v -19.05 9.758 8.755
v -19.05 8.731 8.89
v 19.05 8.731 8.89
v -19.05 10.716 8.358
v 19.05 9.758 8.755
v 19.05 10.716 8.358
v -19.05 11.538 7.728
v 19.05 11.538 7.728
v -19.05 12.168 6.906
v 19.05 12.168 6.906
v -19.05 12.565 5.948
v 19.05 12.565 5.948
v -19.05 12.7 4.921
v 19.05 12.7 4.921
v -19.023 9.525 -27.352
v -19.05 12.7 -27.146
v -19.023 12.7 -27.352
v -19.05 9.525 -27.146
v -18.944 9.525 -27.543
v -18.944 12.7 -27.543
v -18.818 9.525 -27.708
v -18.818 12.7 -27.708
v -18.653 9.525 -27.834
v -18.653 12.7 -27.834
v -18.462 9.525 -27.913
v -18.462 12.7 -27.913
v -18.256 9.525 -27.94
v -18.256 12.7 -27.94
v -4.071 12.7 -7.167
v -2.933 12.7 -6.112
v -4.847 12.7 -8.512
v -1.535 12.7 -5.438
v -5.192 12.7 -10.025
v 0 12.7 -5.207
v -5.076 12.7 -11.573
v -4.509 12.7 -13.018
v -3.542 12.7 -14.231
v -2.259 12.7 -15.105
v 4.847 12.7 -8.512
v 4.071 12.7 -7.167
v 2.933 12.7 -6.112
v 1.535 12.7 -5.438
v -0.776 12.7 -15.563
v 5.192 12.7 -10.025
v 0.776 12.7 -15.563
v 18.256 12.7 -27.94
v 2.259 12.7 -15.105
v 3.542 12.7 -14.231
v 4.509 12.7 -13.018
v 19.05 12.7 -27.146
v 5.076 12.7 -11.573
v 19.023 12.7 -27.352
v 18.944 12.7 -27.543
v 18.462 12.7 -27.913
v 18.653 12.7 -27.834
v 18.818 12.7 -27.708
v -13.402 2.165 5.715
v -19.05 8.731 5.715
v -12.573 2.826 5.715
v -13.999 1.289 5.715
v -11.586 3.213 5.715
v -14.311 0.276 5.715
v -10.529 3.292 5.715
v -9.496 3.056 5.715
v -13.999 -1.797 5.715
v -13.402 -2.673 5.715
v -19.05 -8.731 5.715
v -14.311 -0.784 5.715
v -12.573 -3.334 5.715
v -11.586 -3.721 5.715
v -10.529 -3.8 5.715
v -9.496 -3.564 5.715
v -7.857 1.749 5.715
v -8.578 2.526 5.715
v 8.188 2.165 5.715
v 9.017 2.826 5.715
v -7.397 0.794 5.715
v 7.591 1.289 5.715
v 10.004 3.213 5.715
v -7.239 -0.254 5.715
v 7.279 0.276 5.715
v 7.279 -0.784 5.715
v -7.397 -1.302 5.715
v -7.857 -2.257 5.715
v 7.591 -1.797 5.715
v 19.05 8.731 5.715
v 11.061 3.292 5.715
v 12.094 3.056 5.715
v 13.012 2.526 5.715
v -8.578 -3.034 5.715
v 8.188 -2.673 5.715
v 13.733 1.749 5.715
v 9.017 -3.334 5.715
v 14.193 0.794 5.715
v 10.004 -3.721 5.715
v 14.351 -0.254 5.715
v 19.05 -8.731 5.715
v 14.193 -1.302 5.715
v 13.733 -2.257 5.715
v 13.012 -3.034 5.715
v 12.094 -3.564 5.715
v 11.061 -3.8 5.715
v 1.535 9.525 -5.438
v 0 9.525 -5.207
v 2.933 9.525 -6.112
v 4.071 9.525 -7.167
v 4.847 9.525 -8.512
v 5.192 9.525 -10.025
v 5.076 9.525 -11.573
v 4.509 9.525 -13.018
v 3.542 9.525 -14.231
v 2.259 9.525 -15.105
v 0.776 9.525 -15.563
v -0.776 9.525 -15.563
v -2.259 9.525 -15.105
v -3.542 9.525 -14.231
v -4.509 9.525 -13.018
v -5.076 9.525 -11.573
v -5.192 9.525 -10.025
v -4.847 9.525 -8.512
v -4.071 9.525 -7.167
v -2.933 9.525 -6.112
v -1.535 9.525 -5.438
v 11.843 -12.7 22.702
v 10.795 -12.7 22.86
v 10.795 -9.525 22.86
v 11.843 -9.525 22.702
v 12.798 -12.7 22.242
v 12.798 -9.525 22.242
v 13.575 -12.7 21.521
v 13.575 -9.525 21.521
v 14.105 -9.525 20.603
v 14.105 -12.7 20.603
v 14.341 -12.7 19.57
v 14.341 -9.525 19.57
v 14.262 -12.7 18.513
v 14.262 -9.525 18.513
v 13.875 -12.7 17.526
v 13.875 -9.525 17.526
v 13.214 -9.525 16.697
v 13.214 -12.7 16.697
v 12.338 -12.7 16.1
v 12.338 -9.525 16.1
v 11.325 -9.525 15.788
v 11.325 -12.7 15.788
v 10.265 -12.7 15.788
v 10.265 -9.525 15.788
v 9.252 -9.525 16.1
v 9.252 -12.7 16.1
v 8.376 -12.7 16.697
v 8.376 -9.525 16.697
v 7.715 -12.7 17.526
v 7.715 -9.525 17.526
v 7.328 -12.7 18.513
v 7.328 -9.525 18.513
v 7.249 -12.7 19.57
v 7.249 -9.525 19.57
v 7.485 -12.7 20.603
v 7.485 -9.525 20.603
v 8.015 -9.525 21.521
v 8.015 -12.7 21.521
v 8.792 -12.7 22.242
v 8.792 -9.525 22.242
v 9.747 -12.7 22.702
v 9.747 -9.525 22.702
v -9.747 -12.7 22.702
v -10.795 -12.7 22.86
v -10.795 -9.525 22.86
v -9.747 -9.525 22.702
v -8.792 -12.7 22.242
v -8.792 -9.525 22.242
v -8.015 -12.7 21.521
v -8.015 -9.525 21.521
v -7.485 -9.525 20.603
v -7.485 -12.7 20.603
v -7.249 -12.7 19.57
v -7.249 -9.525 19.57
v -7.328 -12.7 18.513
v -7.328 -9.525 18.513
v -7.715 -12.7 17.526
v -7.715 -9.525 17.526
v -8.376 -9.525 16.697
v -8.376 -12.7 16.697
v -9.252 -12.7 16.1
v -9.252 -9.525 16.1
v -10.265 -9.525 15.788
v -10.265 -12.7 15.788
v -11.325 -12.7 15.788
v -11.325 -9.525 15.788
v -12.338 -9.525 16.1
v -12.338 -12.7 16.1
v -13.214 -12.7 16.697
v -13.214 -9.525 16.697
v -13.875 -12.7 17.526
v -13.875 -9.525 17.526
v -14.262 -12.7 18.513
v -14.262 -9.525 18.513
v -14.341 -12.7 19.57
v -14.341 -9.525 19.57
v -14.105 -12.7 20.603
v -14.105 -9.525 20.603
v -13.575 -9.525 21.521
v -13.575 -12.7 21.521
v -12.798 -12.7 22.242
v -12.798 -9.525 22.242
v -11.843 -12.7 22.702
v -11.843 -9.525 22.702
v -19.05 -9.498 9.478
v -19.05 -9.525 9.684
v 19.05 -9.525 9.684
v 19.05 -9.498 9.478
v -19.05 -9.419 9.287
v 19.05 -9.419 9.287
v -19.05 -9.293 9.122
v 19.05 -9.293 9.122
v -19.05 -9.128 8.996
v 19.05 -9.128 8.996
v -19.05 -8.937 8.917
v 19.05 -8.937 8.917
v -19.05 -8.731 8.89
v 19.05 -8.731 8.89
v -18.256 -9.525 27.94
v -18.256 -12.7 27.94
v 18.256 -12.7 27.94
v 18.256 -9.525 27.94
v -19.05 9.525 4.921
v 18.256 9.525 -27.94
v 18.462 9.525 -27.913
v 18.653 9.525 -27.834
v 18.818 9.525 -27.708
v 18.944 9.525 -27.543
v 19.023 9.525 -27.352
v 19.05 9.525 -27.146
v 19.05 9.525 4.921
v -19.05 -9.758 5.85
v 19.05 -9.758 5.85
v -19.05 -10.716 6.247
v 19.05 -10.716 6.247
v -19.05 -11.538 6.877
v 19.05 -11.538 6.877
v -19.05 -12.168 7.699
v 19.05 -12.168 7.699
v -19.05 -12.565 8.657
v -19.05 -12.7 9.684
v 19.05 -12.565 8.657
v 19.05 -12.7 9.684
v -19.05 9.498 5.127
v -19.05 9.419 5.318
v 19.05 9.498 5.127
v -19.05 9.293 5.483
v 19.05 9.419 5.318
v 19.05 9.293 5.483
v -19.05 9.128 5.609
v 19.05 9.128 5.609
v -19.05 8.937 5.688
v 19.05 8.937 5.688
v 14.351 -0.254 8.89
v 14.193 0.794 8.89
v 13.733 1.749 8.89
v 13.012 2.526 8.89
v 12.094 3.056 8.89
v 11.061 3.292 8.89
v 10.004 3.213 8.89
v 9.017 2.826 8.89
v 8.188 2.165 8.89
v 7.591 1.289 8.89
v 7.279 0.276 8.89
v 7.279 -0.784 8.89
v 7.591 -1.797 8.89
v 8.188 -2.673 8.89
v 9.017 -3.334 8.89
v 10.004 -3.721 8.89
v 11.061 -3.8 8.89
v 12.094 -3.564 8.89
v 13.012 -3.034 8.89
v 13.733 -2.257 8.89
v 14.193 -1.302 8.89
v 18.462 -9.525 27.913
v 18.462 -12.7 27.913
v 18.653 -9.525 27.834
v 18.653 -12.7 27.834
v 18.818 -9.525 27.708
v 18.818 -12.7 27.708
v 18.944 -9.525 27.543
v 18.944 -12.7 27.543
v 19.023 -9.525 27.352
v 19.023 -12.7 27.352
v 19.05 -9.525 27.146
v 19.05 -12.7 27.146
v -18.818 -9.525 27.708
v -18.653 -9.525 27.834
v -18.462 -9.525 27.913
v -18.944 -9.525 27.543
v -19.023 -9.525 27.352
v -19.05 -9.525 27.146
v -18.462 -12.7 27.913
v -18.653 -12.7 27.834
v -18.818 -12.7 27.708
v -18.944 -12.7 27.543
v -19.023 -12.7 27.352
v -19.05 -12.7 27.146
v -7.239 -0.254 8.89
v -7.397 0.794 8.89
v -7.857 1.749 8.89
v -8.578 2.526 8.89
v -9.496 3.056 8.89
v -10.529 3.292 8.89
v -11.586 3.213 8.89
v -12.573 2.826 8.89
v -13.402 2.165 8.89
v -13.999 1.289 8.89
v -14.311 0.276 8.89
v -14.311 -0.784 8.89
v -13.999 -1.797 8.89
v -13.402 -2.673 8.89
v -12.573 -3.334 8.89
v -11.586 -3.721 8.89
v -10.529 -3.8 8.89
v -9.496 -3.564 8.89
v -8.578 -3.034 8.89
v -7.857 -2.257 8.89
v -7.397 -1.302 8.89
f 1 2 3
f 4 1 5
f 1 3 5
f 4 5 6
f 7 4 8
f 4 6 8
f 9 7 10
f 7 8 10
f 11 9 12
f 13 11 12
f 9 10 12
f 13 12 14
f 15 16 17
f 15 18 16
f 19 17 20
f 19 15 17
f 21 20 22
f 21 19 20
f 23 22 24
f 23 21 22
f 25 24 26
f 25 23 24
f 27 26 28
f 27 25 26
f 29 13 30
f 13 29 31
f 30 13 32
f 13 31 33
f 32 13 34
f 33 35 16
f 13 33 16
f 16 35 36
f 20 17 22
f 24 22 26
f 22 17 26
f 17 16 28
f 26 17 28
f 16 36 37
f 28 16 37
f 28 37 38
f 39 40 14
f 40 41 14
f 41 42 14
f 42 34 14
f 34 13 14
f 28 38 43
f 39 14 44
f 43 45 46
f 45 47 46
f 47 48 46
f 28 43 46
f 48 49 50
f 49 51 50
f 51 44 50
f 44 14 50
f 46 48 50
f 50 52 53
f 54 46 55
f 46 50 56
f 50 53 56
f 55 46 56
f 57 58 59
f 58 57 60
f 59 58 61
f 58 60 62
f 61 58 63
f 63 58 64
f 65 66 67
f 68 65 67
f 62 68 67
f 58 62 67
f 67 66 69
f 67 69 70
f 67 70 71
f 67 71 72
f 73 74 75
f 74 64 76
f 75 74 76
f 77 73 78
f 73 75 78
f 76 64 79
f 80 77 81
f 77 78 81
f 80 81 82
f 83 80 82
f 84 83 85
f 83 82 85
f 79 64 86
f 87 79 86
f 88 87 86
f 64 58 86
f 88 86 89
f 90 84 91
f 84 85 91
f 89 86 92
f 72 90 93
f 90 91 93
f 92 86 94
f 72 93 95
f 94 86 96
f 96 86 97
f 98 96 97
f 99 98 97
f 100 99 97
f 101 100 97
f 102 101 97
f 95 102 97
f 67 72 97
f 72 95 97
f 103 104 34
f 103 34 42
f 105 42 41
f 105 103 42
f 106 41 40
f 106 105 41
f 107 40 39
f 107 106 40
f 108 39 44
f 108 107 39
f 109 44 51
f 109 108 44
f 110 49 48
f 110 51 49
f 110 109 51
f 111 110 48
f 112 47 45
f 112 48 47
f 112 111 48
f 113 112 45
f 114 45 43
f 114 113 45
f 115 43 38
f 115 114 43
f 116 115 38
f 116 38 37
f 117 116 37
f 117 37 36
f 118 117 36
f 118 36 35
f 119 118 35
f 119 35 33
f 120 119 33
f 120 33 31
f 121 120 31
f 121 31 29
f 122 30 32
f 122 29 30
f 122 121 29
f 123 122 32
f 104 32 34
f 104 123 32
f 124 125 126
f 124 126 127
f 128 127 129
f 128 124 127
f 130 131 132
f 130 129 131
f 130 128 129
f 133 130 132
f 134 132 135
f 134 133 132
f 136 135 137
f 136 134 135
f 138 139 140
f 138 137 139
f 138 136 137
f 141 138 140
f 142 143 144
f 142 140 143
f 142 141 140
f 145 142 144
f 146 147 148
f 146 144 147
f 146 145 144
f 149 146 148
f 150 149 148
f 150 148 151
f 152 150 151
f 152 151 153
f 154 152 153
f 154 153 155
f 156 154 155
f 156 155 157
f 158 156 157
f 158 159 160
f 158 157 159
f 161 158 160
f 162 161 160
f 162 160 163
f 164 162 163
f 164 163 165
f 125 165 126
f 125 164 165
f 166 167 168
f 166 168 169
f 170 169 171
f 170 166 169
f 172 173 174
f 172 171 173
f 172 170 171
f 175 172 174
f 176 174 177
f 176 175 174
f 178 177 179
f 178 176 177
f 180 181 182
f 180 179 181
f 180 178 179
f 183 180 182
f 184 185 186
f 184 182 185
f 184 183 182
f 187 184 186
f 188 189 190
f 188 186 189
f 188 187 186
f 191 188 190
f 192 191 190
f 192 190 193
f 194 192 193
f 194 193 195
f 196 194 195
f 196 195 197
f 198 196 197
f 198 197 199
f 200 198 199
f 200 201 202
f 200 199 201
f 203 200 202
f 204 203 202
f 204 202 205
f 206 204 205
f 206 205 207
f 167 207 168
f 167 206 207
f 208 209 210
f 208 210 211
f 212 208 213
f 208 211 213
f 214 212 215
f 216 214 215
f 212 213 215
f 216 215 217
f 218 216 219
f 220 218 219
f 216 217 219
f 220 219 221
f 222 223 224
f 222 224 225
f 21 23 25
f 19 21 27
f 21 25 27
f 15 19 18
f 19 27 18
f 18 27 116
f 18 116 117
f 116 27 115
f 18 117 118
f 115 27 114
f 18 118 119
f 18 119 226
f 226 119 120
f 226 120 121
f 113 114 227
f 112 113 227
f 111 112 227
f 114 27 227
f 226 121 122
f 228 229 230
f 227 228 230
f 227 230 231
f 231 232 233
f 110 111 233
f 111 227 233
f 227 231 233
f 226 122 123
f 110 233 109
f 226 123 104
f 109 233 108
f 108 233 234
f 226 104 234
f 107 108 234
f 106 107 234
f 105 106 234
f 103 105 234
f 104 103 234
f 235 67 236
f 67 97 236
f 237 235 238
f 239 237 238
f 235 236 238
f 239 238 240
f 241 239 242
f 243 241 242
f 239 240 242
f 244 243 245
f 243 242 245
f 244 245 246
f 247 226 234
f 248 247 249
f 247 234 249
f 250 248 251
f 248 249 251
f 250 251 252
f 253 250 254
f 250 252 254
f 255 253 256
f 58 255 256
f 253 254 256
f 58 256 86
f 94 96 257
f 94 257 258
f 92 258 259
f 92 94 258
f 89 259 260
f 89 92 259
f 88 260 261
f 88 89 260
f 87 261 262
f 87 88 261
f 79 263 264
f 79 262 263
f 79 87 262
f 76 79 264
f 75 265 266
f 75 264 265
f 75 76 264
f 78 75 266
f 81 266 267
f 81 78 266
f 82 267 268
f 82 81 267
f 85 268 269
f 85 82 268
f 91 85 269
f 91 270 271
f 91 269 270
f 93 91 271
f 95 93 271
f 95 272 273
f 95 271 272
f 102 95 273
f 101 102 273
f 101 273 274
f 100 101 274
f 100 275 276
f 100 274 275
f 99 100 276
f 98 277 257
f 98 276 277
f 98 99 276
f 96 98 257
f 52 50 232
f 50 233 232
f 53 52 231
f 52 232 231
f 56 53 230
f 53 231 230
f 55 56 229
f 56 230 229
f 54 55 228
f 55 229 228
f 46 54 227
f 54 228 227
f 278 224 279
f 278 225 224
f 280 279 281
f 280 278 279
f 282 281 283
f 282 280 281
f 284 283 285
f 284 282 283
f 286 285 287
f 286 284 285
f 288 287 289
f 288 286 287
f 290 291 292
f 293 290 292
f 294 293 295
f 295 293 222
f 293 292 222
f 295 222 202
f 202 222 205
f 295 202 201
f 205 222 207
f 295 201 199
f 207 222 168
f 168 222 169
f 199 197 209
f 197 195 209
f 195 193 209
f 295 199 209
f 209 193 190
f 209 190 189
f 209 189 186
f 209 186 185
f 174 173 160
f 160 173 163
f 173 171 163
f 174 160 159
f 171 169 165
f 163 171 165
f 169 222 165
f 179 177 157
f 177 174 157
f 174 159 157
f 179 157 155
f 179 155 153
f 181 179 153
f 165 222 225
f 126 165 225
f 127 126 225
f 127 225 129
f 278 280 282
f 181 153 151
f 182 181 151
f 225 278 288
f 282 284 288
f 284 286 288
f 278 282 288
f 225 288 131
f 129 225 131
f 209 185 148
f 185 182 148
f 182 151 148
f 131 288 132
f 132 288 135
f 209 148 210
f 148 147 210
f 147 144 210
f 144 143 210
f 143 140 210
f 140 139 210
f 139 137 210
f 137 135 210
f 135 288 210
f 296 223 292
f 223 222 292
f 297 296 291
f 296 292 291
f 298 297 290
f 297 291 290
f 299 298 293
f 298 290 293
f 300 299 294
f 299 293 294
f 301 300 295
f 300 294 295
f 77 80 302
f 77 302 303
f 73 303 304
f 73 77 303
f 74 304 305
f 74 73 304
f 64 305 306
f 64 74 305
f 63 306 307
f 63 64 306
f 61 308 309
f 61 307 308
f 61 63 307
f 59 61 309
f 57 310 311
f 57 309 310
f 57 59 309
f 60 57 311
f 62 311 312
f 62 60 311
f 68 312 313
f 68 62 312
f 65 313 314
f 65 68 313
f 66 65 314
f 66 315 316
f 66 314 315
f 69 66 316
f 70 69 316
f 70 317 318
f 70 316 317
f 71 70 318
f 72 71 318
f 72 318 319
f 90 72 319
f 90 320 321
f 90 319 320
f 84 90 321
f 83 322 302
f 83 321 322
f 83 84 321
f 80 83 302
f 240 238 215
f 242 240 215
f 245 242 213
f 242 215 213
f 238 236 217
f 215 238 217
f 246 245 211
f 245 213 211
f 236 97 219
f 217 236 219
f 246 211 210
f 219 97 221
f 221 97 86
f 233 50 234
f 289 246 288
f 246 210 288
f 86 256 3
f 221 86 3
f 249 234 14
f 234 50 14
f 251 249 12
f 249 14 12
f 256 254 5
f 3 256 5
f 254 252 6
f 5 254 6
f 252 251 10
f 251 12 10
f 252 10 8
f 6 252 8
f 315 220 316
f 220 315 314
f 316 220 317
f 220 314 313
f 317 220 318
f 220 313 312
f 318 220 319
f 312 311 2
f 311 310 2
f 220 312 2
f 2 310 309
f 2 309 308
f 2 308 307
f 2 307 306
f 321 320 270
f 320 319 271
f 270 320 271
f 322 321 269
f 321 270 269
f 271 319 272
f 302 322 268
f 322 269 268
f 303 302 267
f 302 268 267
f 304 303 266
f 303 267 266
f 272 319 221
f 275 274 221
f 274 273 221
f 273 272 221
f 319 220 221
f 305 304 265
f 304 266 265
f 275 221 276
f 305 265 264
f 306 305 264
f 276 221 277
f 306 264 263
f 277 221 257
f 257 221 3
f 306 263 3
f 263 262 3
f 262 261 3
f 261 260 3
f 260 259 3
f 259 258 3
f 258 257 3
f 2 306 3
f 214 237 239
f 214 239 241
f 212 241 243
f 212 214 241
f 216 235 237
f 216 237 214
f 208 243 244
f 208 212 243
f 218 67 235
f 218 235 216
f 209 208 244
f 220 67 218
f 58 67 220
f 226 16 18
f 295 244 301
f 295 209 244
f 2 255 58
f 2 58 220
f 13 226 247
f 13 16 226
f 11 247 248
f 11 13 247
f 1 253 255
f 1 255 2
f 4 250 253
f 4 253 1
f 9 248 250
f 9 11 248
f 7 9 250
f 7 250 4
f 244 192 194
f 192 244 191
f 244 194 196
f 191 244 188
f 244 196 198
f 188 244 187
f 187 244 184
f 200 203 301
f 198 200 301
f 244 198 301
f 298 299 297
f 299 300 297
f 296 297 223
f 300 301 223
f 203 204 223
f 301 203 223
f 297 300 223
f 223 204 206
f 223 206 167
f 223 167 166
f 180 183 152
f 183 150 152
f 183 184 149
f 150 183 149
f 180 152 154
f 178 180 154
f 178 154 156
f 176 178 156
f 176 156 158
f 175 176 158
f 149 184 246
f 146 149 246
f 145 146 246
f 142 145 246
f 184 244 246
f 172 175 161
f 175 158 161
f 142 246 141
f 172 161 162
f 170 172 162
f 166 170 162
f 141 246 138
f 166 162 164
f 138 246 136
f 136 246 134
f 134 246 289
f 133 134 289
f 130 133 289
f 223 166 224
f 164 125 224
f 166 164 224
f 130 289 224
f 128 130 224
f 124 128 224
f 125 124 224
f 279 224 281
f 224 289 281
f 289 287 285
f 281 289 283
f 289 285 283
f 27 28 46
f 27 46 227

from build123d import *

# Parameters (mm, degrees)
EXTRUDE_THIN2_DEPTH     = 19.05
CUT_EXTRUDE1_DEPTH      = 37.122515139
CUT_EXTRUDE1_DEPTH_BACK = 37.122515139
SKETCH7_R               = 5.207
SKETCH7_R_2             = 3.556
CUT_EXTRUDE2_DEPTH      = 37.122515139
CUT_EXTRUDE2_DEPTH_BACK = 37.122515139
SKETCH8_R               = 3.556
FILLET1_R               = 0.79375


with BuildPart() as part:
    # Sketch5 → Extrude-Thin2 (new, symmetric)
    with BuildSketch(Plane(origin=(0, 0, 0), x_dir=(0, 0, -1), z_dir=(1, 0, 0))):
        with BuildLine():
            Line((-27.94, -9.525), (-9.68375, -9.525))
            ThreePointArc((-9.68375, -9.525), (-9.122483992, -9.292516008), (-8.89, -8.73125))
            Line((-8.89, -8.73125), (-8.89, 8.73125))
            ThreePointArc((-8.89, 8.73125), (-7.727580038, 11.537580038), (-4.92125, 12.7))
            Line((-4.92125, 12.7), (27.94, 12.7))
            Line((27.94, 12.7), (27.94, 9.525))
            Line((27.94, 9.525), (-4.92125, 9.525))
            ThreePointArc((-4.92125, 9.525), (-5.482516008, 9.292516008), (-5.715, 8.73125))
            Line((-5.715, 8.73125), (-5.715, -8.73125))
            ThreePointArc((-5.715, -8.73125), (-6.877419962, -11.537580038), (-9.68375, -12.7))
            Line((-9.68375, -12.7), (-27.94, -12.7))
            Line((-27.94, -12.7), (-27.94, -9.525))
        make_face()
    extrude(amount=EXTRUDE_THIN2_DEPTH, both=True)

    # Sketch7 → Cut-Extrude1 (cut, two sides: drawn at the far end of the back side and taken through both)
    with BuildSketch(Plane(origin=(0, 0, 0), x_dir=(1, 0, 0), z_dir=(0, 1, 0)).offset(-CUT_EXTRUDE1_DEPTH_BACK)):
        with Locations(Location((0, 10.414, 0), (0, 0, 270))):
            Circle(SKETCH7_R)
        with Locations(Location((10.795, -19.304, 0), (0, 0, 270))):
            Circle(SKETCH7_R_2)
        with Locations(Location((-10.795, -19.304, 0), (0, 0, 270))):
            Circle(SKETCH7_R_2)
    extrude(amount=CUT_EXTRUDE1_DEPTH + CUT_EXTRUDE1_DEPTH_BACK, mode=Mode.SUBTRACT)

    # Sketch8 → Cut-Extrude2 (cut, two sides: drawn at the far end of the back side and taken through both)
    with BuildSketch(Plane.XY.offset(-CUT_EXTRUDE2_DEPTH_BACK)):
        with Locations((10.795, -0.254)):
            Circle(SKETCH8_R)
        with Locations((-10.795, -0.254)):
            Circle(SKETCH8_R)
    extrude(amount=CUT_EXTRUDE2_DEPTH + CUT_EXTRUDE2_DEPTH_BACK, mode=Mode.SUBTRACT)

    # Fillet1
    fillet1_edges = [part.edges().sort_by_distance(p)[0] for p in [
        (-19.05, -11.1125, 27.94),
        (-19.05, 11.1125, -27.94),
        (19.05, -11.1125, 27.94),
        (19.05, 11.1125, -27.94),
    ]]
    fillet(fillet1_edges, radius=FILLET1_R)


solid = part.part
